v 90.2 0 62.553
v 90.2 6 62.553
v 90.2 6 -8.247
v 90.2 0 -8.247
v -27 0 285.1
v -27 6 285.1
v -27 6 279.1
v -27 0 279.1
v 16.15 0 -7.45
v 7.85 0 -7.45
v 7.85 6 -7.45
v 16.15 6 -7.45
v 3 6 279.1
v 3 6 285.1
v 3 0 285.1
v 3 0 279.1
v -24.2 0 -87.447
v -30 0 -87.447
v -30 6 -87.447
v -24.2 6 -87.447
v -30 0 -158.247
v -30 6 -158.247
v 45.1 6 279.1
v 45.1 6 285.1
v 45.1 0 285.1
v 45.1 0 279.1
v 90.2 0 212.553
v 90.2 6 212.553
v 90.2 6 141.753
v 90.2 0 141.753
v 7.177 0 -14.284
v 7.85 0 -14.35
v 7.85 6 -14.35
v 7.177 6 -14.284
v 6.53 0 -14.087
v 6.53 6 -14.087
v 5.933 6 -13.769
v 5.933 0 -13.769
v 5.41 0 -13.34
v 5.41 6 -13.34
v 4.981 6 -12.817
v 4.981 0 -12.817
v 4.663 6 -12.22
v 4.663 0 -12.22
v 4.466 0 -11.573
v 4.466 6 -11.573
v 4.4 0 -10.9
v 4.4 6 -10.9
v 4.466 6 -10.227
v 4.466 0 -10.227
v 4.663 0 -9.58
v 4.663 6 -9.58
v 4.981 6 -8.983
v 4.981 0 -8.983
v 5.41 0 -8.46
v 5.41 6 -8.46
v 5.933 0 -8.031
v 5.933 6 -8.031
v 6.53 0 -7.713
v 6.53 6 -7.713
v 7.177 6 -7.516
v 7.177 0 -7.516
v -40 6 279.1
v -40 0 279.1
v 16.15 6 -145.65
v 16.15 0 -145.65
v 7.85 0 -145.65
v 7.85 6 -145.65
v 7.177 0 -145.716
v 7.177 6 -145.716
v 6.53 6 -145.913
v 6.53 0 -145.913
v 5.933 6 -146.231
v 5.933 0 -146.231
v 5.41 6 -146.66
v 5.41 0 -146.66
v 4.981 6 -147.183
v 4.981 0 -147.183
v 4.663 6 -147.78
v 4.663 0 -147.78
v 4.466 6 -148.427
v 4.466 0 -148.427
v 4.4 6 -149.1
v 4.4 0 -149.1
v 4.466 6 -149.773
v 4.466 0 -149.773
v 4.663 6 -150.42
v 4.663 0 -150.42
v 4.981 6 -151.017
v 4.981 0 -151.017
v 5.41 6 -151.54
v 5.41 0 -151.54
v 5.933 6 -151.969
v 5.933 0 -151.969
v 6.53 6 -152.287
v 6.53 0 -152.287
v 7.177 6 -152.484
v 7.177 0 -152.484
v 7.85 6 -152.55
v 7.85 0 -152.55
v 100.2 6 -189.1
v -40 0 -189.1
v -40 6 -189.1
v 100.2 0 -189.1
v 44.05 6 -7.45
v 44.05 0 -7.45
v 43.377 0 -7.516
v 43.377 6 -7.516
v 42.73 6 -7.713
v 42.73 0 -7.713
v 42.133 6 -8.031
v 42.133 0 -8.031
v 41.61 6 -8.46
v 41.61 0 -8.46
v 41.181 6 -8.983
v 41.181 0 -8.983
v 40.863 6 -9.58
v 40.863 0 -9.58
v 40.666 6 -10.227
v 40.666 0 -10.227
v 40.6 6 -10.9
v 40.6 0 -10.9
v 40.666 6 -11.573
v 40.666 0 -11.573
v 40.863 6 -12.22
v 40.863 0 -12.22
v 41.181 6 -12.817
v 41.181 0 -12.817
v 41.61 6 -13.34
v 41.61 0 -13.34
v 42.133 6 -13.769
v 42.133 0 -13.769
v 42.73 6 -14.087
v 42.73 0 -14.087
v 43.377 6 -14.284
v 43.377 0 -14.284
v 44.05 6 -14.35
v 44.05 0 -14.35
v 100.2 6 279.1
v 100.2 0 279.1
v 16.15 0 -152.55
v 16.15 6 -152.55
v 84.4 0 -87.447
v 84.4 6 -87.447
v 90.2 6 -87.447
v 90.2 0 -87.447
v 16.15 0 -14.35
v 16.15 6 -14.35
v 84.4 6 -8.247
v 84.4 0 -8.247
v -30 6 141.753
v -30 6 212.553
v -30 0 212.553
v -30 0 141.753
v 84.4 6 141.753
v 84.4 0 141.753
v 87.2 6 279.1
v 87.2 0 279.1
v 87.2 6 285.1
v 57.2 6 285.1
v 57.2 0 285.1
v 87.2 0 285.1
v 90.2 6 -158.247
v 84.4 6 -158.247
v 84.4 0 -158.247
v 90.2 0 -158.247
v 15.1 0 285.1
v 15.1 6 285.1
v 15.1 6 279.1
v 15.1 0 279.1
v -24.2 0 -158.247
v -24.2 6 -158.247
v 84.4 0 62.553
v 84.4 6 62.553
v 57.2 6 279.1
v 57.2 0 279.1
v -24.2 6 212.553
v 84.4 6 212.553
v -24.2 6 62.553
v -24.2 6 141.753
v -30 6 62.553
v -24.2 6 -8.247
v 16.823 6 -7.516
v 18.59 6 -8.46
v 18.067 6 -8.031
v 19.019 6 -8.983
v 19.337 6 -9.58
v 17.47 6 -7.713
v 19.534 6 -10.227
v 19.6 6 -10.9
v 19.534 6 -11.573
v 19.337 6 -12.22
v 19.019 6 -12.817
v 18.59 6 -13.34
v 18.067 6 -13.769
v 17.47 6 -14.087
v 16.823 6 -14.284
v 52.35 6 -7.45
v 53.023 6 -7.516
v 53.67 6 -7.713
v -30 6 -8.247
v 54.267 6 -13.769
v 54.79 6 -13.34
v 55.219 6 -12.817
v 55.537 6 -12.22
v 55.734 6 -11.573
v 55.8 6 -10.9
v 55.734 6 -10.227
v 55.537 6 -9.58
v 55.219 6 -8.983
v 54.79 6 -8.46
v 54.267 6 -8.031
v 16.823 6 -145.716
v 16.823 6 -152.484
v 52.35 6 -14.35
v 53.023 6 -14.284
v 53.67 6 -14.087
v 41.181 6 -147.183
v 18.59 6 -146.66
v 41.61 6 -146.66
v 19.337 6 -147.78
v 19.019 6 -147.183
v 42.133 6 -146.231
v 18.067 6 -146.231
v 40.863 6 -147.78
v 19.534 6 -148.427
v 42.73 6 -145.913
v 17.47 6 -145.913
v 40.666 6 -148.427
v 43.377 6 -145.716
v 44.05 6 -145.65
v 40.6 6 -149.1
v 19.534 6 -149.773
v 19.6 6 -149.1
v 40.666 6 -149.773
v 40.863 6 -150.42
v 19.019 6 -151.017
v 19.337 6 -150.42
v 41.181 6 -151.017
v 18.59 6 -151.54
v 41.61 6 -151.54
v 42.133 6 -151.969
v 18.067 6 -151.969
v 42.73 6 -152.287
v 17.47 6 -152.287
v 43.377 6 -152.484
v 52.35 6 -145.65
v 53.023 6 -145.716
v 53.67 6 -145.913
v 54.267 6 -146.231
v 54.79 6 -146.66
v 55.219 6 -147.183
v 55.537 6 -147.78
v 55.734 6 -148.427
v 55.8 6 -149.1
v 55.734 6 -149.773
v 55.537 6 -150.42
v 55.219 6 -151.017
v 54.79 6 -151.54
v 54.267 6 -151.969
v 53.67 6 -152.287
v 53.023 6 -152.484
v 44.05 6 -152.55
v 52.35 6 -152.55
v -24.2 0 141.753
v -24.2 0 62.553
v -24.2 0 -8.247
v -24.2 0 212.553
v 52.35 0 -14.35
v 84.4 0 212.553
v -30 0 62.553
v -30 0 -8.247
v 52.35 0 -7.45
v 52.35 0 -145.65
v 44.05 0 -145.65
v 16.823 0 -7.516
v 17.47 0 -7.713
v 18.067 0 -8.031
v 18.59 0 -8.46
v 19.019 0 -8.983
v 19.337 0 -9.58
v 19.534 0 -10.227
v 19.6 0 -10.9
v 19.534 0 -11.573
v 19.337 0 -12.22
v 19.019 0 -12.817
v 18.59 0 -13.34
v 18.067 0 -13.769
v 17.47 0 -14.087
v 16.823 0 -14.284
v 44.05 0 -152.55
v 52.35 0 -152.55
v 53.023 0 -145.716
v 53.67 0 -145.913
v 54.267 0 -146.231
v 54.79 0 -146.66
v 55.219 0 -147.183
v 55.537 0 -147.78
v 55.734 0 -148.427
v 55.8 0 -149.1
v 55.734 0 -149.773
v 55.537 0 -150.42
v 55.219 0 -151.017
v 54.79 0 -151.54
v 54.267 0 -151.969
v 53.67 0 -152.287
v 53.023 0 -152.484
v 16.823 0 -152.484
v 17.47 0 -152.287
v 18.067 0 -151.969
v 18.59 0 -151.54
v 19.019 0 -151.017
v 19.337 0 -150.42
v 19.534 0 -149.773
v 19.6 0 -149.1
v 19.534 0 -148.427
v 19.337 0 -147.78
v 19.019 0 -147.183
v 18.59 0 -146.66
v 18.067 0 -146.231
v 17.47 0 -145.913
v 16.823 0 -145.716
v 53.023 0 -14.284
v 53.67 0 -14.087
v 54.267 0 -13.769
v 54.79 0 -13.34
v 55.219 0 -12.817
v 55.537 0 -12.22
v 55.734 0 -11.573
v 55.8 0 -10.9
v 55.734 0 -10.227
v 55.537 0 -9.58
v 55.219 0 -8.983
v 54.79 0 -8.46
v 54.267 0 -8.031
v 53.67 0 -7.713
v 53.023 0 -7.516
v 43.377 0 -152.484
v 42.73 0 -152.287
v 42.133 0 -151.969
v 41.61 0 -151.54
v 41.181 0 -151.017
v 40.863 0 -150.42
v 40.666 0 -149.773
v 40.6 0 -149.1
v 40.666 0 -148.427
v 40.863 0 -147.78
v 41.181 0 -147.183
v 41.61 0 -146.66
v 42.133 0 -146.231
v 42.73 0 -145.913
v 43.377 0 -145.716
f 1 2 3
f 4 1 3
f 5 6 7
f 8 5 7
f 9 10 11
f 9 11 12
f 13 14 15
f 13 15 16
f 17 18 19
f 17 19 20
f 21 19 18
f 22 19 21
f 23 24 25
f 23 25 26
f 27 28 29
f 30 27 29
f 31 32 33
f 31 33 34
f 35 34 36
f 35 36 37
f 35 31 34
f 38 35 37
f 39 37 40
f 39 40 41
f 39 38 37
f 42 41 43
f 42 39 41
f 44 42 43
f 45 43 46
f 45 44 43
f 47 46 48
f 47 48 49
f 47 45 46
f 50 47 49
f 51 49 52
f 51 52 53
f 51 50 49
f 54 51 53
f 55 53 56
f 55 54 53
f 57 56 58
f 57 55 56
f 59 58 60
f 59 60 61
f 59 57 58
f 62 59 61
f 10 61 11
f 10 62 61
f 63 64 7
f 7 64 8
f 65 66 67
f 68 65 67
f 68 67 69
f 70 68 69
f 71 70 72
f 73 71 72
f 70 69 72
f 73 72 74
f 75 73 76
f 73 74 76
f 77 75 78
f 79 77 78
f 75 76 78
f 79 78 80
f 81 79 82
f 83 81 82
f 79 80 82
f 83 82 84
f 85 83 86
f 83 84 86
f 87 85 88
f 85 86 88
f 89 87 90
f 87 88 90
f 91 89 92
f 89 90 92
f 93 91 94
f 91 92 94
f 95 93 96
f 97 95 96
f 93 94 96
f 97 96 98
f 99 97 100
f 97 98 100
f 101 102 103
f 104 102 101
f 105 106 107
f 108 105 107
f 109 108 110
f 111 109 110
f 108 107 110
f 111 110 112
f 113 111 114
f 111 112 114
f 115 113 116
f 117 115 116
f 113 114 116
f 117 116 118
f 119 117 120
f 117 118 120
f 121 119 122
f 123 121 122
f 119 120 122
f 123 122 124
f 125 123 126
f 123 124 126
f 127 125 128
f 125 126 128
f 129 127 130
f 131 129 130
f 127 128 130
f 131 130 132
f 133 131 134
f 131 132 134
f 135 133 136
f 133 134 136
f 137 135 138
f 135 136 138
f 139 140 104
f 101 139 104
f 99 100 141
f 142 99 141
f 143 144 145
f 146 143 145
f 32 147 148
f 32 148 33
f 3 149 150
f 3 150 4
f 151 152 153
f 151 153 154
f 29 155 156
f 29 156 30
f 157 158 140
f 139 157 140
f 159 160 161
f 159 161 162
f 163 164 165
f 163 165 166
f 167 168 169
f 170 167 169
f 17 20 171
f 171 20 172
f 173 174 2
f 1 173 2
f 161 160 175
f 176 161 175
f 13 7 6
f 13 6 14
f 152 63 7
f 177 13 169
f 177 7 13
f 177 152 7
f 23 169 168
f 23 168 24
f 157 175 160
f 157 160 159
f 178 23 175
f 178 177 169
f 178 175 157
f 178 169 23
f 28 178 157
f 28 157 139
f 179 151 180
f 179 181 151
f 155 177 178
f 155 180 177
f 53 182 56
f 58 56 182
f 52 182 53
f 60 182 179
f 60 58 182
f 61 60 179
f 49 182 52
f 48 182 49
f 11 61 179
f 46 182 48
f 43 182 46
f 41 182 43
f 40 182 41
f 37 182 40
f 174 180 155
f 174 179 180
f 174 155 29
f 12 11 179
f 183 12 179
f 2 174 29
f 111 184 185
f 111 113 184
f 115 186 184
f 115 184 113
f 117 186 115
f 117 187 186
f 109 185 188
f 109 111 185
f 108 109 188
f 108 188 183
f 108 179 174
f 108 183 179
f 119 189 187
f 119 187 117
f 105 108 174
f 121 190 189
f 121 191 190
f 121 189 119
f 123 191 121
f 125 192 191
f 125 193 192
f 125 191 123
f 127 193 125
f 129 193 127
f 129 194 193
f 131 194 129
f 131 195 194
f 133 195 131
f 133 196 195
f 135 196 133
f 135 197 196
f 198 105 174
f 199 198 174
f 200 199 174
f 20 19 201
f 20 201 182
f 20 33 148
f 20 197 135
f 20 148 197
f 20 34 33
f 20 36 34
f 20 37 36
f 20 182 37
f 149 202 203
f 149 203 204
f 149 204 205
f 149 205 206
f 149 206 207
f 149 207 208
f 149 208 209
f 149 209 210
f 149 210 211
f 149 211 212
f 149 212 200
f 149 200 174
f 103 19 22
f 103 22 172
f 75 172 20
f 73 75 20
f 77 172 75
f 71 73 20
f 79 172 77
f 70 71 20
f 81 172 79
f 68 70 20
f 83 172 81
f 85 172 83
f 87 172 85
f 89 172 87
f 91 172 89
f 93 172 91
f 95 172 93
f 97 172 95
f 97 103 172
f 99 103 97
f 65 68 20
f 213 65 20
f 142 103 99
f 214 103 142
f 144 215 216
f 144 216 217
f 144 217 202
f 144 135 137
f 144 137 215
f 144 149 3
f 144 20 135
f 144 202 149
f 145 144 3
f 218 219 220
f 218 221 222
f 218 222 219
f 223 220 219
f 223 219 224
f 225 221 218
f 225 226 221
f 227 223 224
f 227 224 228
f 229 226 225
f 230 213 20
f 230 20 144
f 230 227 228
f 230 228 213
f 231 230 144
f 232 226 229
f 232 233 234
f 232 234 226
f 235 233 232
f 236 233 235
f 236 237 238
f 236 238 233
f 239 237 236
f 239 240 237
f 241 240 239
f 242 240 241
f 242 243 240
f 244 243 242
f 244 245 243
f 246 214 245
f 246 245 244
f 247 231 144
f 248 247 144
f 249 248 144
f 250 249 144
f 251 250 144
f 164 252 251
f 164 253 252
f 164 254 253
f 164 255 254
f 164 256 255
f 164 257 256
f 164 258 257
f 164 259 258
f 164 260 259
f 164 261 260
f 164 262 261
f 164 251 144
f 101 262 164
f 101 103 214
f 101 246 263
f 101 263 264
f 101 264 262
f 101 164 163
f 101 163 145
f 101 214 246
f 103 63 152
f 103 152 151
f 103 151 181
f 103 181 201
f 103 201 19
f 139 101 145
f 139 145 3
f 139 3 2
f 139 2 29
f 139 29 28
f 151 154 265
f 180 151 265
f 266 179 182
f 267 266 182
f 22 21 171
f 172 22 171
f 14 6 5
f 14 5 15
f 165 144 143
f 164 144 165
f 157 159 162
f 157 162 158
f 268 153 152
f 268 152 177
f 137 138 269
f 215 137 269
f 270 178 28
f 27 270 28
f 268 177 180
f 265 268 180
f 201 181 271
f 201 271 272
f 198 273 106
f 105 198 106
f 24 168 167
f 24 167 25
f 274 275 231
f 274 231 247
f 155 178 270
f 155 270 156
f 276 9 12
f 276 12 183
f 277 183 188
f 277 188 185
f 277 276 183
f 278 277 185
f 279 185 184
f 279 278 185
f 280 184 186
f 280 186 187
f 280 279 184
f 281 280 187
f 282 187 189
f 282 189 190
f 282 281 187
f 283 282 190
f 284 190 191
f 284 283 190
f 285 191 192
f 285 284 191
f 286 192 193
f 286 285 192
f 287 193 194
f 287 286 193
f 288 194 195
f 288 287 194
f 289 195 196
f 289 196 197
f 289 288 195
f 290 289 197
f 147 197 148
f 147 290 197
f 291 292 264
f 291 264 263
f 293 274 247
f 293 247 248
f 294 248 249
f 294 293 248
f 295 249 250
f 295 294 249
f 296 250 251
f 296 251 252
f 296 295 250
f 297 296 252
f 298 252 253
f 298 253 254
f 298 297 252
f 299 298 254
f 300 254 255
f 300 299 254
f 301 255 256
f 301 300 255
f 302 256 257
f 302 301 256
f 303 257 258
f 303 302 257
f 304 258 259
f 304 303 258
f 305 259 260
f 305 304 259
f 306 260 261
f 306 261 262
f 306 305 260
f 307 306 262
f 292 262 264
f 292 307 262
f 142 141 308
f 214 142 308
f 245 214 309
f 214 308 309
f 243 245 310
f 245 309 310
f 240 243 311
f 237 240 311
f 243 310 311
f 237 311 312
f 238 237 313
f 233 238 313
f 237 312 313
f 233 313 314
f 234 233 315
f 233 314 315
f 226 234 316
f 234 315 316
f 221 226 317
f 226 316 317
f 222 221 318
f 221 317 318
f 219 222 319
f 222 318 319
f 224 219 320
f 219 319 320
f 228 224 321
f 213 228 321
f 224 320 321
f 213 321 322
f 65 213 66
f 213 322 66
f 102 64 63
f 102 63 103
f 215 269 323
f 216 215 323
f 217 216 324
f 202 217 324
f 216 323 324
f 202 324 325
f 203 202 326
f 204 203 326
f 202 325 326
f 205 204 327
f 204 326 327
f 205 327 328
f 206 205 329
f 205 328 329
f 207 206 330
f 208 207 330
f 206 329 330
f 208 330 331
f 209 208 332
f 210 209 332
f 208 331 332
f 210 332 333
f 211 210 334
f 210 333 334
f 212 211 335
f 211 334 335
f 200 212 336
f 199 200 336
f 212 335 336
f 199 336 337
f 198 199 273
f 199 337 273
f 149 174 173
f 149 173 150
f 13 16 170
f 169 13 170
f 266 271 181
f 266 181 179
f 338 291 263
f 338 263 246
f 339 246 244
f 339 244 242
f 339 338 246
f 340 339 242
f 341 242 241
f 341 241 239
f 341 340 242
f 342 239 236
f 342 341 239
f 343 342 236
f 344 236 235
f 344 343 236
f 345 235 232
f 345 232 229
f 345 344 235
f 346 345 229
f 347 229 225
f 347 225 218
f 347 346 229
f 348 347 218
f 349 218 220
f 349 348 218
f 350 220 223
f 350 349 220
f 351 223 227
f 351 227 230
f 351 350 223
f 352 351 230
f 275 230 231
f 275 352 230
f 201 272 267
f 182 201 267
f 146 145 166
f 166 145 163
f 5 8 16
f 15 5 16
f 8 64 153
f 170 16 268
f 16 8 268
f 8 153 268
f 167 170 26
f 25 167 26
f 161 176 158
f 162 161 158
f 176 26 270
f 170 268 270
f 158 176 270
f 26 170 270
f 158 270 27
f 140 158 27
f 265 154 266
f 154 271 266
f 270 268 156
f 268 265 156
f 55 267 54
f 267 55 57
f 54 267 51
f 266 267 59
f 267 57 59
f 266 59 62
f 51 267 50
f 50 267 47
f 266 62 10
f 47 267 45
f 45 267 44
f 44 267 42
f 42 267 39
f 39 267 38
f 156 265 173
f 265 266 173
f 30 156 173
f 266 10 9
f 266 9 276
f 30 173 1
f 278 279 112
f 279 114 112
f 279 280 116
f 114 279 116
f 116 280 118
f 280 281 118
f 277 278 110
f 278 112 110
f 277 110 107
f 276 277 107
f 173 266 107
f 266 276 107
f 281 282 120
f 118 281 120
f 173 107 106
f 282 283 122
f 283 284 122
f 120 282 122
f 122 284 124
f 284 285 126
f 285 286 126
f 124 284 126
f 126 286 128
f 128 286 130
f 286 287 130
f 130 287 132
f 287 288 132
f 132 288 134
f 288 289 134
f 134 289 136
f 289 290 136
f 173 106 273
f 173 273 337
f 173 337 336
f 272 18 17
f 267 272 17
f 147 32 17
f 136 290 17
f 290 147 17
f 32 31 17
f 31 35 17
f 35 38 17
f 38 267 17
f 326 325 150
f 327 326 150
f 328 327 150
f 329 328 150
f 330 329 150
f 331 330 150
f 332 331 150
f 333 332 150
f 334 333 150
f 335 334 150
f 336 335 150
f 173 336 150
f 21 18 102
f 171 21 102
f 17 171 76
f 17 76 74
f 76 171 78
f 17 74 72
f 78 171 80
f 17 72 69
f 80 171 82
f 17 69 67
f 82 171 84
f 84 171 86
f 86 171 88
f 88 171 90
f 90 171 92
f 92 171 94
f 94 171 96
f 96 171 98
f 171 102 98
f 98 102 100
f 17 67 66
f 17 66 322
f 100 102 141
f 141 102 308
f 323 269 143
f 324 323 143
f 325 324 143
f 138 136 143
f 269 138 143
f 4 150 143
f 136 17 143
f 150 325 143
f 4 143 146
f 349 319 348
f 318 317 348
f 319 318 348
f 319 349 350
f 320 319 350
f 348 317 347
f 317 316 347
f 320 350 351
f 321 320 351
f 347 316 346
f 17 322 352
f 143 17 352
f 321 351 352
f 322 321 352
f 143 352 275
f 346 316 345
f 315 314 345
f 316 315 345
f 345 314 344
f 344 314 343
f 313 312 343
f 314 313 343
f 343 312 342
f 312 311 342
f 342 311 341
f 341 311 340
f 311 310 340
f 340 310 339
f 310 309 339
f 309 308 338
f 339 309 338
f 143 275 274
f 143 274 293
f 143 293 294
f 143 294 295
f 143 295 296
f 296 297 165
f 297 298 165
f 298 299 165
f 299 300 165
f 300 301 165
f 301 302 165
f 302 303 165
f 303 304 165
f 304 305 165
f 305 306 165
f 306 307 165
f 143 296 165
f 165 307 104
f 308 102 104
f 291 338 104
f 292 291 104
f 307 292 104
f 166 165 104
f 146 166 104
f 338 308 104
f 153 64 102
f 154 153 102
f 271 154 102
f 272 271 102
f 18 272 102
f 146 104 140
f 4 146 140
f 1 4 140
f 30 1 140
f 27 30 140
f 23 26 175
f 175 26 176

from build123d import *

# Parameters (mm, degrees)
SKETCH1_W           = 60.2
SKETCH1_H           = 160
BOSS_EXTRUDE1_DEPTH = 6
BOSS_EXTRUDE2_START = -6
SKETCH2_W           = 140.2
SKETCH2_H           = 468.2
BOSS_EXTRUDE2_DEPTH = 6
SKETCH3_W           = 5.8
SKETCH3_H           = 70.8
CUT_EXTRUDE1_DEPTH  = 6
SKETCH4_W           = 30
SKETCH4_H           = 6
BOSS_EXTRUDE3_DEPTH = 6


with BuildPart() as part:
    # Sketch1 → Boss-Extrude1 (new body)
    with BuildSketch(Plane(origin=(0, 0, 0), x_dir=(1, 0, 0), z_dir=(0, 1, 0))):
        with Locations((30.1, 80)):
            Rectangle(SKETCH1_W, SKETCH1_H)
        with BuildLine():
            Line((7.85, 152.55), (16.15, 152.55))
            ThreePointArc((16.15, 152.55), (19.6, 149.1), (16.15, 145.65))
            Line((16.15, 145.65), (7.85, 145.65))
            ThreePointArc((7.85, 145.65), (4.4, 149.1), (7.85, 152.55))
        make_face(mode=Mode.SUBTRACT)
        with BuildLine():
            Line((44.05, 145.65), (52.35, 145.65))
            ThreePointArc((52.35, 145.65), (55.8, 149.1), (52.35, 152.55))
            Line((52.35, 152.55), (44.05, 152.55))
            ThreePointArc((44.05, 152.55), (40.6, 149.1), (44.05, 145.65))
        make_face(mode=Mode.SUBTRACT)
        with BuildLine():
            Line((52.35, 7.45), (44.05, 7.45))
            ThreePointArc((44.05, 7.45), (40.6, 10.9), (44.05, 14.35))
            Line((44.05, 14.35), (52.35, 14.35))
            ThreePointArc((52.35, 14.35), (55.8, 10.9), (52.35, 7.45))
        make_face(mode=Mode.SUBTRACT)
        with BuildLine():
            Line((16.15, 14.35), (7.85, 14.35))
            ThreePointArc((7.85, 14.35), (4.4, 10.9), (7.85, 7.45))
            Line((7.85, 7.45), (16.15, 7.45))
            ThreePointArc((16.15, 7.45), (19.6, 10.9), (16.15, 14.35))
        make_face(mode=Mode.SUBTRACT)
    extrude(amount=BOSS_EXTRUDE1_DEPTH)

    # Sketch2 → Boss-Extrude2 (add)
    with BuildSketch(Plane(origin=(0, 6, 0), x_dir=(1, 0, 0), z_dir=(0, 1, 0)).offset(BOSS_EXTRUDE2_START)):
        with Locations((30.1, -45)):
            Rectangle(SKETCH2_W, SKETCH2_H)
        with BuildLine():
            Line((16.15, 7.45), (7.85, 7.45))
            ThreePointArc((7.85, 7.45), (4.4, 10.9), (7.85, 14.35))
            Line((7.85, 14.35), (16.15, 14.35))
            ThreePointArc((16.15, 14.35), (19.6, 10.9), (16.15, 7.45))
        make_face(mode=Mode.SUBTRACT)
        with BuildLine():
            Line((16.15, 145.65), (7.85, 145.65))
            ThreePointArc((7.85, 145.65), (4.4, 149.1), (7.85, 152.55))
            Line((7.85, 152.55), (16.15, 152.55))
            ThreePointArc((16.15, 152.55), (19.6, 149.1), (16.15, 145.65))
        make_face(mode=Mode.SUBTRACT)
        with BuildLine():
            Line((52.35, 7.45), (44.05, 7.45))
            ThreePointArc((44.05, 7.45), (40.6, 10.9), (44.05, 14.35))
            Line((44.05, 14.35), (52.35, 14.35))
            ThreePointArc((52.35, 14.35), (55.8, 10.9), (52.35, 7.45))
        make_face(mode=Mode.SUBTRACT)
        with BuildLine():
            Line((52.35, 145.65), (44.05, 145.65))
            ThreePointArc((44.05, 145.65), (40.6, 149.1), (44.05, 152.55))
            Line((44.05, 152.55), (52.35, 152.55))
            ThreePointArc((52.35, 152.55), (55.8, 149.1), (52.35, 145.65))
        make_face(mode=Mode.SUBTRACT)
    extrude(amount=BOSS_EXTRUDE2_DEPTH)

    # Sketch3 → Cut-Extrude1 (cut)
    with BuildSketch(Plane(origin=(0, 6, 0), x_dir=(1, 0, 0), z_dir=(0, 1, 0))):
        with Locations((87.3, 122.8465093)):
            Rectangle(SKETCH3_W, SKETCH3_H)
        with Locations((-27.1, 122.8465093)):
            Rectangle(SKETCH3_W, SKETCH3_H)
        with Locations((-27.1, -27.1534907)):
            Rectangle(SKETCH3_W, SKETCH3_H)
        with Locations((87.3, -27.1534907)):
            Rectangle(SKETCH3_W, SKETCH3_H)
        with Locations((-27.1, -177.1534907)):
            Rectangle(SKETCH3_W, SKETCH3_H)
        with Locations((87.3, -177.1534907)):
            Rectangle(SKETCH3_W, SKETCH3_H)
    extrude(amount=-CUT_EXTRUDE1_DEPTH, mode=Mode.SUBTRACT)

    # Sketch4 → Boss-Extrude3 (add)
    with BuildSketch(Plane(origin=(0, 6, 0), x_dir=(1, 0, 0), z_dir=(0, 1, 0))):
        with Locations((-12, -282.1)):
            Rectangle(SKETCH4_W, SKETCH4_H)
        with Locations((30.1, -282.1)):
            Rectangle(SKETCH4_W, SKETCH4_H)
        with Locations((72.2, -282.1)):
            Rectangle(SKETCH4_W, SKETCH4_H)
    extrude(amount=-BOSS_EXTRUDE3_DEPTH)


solid = part.part
